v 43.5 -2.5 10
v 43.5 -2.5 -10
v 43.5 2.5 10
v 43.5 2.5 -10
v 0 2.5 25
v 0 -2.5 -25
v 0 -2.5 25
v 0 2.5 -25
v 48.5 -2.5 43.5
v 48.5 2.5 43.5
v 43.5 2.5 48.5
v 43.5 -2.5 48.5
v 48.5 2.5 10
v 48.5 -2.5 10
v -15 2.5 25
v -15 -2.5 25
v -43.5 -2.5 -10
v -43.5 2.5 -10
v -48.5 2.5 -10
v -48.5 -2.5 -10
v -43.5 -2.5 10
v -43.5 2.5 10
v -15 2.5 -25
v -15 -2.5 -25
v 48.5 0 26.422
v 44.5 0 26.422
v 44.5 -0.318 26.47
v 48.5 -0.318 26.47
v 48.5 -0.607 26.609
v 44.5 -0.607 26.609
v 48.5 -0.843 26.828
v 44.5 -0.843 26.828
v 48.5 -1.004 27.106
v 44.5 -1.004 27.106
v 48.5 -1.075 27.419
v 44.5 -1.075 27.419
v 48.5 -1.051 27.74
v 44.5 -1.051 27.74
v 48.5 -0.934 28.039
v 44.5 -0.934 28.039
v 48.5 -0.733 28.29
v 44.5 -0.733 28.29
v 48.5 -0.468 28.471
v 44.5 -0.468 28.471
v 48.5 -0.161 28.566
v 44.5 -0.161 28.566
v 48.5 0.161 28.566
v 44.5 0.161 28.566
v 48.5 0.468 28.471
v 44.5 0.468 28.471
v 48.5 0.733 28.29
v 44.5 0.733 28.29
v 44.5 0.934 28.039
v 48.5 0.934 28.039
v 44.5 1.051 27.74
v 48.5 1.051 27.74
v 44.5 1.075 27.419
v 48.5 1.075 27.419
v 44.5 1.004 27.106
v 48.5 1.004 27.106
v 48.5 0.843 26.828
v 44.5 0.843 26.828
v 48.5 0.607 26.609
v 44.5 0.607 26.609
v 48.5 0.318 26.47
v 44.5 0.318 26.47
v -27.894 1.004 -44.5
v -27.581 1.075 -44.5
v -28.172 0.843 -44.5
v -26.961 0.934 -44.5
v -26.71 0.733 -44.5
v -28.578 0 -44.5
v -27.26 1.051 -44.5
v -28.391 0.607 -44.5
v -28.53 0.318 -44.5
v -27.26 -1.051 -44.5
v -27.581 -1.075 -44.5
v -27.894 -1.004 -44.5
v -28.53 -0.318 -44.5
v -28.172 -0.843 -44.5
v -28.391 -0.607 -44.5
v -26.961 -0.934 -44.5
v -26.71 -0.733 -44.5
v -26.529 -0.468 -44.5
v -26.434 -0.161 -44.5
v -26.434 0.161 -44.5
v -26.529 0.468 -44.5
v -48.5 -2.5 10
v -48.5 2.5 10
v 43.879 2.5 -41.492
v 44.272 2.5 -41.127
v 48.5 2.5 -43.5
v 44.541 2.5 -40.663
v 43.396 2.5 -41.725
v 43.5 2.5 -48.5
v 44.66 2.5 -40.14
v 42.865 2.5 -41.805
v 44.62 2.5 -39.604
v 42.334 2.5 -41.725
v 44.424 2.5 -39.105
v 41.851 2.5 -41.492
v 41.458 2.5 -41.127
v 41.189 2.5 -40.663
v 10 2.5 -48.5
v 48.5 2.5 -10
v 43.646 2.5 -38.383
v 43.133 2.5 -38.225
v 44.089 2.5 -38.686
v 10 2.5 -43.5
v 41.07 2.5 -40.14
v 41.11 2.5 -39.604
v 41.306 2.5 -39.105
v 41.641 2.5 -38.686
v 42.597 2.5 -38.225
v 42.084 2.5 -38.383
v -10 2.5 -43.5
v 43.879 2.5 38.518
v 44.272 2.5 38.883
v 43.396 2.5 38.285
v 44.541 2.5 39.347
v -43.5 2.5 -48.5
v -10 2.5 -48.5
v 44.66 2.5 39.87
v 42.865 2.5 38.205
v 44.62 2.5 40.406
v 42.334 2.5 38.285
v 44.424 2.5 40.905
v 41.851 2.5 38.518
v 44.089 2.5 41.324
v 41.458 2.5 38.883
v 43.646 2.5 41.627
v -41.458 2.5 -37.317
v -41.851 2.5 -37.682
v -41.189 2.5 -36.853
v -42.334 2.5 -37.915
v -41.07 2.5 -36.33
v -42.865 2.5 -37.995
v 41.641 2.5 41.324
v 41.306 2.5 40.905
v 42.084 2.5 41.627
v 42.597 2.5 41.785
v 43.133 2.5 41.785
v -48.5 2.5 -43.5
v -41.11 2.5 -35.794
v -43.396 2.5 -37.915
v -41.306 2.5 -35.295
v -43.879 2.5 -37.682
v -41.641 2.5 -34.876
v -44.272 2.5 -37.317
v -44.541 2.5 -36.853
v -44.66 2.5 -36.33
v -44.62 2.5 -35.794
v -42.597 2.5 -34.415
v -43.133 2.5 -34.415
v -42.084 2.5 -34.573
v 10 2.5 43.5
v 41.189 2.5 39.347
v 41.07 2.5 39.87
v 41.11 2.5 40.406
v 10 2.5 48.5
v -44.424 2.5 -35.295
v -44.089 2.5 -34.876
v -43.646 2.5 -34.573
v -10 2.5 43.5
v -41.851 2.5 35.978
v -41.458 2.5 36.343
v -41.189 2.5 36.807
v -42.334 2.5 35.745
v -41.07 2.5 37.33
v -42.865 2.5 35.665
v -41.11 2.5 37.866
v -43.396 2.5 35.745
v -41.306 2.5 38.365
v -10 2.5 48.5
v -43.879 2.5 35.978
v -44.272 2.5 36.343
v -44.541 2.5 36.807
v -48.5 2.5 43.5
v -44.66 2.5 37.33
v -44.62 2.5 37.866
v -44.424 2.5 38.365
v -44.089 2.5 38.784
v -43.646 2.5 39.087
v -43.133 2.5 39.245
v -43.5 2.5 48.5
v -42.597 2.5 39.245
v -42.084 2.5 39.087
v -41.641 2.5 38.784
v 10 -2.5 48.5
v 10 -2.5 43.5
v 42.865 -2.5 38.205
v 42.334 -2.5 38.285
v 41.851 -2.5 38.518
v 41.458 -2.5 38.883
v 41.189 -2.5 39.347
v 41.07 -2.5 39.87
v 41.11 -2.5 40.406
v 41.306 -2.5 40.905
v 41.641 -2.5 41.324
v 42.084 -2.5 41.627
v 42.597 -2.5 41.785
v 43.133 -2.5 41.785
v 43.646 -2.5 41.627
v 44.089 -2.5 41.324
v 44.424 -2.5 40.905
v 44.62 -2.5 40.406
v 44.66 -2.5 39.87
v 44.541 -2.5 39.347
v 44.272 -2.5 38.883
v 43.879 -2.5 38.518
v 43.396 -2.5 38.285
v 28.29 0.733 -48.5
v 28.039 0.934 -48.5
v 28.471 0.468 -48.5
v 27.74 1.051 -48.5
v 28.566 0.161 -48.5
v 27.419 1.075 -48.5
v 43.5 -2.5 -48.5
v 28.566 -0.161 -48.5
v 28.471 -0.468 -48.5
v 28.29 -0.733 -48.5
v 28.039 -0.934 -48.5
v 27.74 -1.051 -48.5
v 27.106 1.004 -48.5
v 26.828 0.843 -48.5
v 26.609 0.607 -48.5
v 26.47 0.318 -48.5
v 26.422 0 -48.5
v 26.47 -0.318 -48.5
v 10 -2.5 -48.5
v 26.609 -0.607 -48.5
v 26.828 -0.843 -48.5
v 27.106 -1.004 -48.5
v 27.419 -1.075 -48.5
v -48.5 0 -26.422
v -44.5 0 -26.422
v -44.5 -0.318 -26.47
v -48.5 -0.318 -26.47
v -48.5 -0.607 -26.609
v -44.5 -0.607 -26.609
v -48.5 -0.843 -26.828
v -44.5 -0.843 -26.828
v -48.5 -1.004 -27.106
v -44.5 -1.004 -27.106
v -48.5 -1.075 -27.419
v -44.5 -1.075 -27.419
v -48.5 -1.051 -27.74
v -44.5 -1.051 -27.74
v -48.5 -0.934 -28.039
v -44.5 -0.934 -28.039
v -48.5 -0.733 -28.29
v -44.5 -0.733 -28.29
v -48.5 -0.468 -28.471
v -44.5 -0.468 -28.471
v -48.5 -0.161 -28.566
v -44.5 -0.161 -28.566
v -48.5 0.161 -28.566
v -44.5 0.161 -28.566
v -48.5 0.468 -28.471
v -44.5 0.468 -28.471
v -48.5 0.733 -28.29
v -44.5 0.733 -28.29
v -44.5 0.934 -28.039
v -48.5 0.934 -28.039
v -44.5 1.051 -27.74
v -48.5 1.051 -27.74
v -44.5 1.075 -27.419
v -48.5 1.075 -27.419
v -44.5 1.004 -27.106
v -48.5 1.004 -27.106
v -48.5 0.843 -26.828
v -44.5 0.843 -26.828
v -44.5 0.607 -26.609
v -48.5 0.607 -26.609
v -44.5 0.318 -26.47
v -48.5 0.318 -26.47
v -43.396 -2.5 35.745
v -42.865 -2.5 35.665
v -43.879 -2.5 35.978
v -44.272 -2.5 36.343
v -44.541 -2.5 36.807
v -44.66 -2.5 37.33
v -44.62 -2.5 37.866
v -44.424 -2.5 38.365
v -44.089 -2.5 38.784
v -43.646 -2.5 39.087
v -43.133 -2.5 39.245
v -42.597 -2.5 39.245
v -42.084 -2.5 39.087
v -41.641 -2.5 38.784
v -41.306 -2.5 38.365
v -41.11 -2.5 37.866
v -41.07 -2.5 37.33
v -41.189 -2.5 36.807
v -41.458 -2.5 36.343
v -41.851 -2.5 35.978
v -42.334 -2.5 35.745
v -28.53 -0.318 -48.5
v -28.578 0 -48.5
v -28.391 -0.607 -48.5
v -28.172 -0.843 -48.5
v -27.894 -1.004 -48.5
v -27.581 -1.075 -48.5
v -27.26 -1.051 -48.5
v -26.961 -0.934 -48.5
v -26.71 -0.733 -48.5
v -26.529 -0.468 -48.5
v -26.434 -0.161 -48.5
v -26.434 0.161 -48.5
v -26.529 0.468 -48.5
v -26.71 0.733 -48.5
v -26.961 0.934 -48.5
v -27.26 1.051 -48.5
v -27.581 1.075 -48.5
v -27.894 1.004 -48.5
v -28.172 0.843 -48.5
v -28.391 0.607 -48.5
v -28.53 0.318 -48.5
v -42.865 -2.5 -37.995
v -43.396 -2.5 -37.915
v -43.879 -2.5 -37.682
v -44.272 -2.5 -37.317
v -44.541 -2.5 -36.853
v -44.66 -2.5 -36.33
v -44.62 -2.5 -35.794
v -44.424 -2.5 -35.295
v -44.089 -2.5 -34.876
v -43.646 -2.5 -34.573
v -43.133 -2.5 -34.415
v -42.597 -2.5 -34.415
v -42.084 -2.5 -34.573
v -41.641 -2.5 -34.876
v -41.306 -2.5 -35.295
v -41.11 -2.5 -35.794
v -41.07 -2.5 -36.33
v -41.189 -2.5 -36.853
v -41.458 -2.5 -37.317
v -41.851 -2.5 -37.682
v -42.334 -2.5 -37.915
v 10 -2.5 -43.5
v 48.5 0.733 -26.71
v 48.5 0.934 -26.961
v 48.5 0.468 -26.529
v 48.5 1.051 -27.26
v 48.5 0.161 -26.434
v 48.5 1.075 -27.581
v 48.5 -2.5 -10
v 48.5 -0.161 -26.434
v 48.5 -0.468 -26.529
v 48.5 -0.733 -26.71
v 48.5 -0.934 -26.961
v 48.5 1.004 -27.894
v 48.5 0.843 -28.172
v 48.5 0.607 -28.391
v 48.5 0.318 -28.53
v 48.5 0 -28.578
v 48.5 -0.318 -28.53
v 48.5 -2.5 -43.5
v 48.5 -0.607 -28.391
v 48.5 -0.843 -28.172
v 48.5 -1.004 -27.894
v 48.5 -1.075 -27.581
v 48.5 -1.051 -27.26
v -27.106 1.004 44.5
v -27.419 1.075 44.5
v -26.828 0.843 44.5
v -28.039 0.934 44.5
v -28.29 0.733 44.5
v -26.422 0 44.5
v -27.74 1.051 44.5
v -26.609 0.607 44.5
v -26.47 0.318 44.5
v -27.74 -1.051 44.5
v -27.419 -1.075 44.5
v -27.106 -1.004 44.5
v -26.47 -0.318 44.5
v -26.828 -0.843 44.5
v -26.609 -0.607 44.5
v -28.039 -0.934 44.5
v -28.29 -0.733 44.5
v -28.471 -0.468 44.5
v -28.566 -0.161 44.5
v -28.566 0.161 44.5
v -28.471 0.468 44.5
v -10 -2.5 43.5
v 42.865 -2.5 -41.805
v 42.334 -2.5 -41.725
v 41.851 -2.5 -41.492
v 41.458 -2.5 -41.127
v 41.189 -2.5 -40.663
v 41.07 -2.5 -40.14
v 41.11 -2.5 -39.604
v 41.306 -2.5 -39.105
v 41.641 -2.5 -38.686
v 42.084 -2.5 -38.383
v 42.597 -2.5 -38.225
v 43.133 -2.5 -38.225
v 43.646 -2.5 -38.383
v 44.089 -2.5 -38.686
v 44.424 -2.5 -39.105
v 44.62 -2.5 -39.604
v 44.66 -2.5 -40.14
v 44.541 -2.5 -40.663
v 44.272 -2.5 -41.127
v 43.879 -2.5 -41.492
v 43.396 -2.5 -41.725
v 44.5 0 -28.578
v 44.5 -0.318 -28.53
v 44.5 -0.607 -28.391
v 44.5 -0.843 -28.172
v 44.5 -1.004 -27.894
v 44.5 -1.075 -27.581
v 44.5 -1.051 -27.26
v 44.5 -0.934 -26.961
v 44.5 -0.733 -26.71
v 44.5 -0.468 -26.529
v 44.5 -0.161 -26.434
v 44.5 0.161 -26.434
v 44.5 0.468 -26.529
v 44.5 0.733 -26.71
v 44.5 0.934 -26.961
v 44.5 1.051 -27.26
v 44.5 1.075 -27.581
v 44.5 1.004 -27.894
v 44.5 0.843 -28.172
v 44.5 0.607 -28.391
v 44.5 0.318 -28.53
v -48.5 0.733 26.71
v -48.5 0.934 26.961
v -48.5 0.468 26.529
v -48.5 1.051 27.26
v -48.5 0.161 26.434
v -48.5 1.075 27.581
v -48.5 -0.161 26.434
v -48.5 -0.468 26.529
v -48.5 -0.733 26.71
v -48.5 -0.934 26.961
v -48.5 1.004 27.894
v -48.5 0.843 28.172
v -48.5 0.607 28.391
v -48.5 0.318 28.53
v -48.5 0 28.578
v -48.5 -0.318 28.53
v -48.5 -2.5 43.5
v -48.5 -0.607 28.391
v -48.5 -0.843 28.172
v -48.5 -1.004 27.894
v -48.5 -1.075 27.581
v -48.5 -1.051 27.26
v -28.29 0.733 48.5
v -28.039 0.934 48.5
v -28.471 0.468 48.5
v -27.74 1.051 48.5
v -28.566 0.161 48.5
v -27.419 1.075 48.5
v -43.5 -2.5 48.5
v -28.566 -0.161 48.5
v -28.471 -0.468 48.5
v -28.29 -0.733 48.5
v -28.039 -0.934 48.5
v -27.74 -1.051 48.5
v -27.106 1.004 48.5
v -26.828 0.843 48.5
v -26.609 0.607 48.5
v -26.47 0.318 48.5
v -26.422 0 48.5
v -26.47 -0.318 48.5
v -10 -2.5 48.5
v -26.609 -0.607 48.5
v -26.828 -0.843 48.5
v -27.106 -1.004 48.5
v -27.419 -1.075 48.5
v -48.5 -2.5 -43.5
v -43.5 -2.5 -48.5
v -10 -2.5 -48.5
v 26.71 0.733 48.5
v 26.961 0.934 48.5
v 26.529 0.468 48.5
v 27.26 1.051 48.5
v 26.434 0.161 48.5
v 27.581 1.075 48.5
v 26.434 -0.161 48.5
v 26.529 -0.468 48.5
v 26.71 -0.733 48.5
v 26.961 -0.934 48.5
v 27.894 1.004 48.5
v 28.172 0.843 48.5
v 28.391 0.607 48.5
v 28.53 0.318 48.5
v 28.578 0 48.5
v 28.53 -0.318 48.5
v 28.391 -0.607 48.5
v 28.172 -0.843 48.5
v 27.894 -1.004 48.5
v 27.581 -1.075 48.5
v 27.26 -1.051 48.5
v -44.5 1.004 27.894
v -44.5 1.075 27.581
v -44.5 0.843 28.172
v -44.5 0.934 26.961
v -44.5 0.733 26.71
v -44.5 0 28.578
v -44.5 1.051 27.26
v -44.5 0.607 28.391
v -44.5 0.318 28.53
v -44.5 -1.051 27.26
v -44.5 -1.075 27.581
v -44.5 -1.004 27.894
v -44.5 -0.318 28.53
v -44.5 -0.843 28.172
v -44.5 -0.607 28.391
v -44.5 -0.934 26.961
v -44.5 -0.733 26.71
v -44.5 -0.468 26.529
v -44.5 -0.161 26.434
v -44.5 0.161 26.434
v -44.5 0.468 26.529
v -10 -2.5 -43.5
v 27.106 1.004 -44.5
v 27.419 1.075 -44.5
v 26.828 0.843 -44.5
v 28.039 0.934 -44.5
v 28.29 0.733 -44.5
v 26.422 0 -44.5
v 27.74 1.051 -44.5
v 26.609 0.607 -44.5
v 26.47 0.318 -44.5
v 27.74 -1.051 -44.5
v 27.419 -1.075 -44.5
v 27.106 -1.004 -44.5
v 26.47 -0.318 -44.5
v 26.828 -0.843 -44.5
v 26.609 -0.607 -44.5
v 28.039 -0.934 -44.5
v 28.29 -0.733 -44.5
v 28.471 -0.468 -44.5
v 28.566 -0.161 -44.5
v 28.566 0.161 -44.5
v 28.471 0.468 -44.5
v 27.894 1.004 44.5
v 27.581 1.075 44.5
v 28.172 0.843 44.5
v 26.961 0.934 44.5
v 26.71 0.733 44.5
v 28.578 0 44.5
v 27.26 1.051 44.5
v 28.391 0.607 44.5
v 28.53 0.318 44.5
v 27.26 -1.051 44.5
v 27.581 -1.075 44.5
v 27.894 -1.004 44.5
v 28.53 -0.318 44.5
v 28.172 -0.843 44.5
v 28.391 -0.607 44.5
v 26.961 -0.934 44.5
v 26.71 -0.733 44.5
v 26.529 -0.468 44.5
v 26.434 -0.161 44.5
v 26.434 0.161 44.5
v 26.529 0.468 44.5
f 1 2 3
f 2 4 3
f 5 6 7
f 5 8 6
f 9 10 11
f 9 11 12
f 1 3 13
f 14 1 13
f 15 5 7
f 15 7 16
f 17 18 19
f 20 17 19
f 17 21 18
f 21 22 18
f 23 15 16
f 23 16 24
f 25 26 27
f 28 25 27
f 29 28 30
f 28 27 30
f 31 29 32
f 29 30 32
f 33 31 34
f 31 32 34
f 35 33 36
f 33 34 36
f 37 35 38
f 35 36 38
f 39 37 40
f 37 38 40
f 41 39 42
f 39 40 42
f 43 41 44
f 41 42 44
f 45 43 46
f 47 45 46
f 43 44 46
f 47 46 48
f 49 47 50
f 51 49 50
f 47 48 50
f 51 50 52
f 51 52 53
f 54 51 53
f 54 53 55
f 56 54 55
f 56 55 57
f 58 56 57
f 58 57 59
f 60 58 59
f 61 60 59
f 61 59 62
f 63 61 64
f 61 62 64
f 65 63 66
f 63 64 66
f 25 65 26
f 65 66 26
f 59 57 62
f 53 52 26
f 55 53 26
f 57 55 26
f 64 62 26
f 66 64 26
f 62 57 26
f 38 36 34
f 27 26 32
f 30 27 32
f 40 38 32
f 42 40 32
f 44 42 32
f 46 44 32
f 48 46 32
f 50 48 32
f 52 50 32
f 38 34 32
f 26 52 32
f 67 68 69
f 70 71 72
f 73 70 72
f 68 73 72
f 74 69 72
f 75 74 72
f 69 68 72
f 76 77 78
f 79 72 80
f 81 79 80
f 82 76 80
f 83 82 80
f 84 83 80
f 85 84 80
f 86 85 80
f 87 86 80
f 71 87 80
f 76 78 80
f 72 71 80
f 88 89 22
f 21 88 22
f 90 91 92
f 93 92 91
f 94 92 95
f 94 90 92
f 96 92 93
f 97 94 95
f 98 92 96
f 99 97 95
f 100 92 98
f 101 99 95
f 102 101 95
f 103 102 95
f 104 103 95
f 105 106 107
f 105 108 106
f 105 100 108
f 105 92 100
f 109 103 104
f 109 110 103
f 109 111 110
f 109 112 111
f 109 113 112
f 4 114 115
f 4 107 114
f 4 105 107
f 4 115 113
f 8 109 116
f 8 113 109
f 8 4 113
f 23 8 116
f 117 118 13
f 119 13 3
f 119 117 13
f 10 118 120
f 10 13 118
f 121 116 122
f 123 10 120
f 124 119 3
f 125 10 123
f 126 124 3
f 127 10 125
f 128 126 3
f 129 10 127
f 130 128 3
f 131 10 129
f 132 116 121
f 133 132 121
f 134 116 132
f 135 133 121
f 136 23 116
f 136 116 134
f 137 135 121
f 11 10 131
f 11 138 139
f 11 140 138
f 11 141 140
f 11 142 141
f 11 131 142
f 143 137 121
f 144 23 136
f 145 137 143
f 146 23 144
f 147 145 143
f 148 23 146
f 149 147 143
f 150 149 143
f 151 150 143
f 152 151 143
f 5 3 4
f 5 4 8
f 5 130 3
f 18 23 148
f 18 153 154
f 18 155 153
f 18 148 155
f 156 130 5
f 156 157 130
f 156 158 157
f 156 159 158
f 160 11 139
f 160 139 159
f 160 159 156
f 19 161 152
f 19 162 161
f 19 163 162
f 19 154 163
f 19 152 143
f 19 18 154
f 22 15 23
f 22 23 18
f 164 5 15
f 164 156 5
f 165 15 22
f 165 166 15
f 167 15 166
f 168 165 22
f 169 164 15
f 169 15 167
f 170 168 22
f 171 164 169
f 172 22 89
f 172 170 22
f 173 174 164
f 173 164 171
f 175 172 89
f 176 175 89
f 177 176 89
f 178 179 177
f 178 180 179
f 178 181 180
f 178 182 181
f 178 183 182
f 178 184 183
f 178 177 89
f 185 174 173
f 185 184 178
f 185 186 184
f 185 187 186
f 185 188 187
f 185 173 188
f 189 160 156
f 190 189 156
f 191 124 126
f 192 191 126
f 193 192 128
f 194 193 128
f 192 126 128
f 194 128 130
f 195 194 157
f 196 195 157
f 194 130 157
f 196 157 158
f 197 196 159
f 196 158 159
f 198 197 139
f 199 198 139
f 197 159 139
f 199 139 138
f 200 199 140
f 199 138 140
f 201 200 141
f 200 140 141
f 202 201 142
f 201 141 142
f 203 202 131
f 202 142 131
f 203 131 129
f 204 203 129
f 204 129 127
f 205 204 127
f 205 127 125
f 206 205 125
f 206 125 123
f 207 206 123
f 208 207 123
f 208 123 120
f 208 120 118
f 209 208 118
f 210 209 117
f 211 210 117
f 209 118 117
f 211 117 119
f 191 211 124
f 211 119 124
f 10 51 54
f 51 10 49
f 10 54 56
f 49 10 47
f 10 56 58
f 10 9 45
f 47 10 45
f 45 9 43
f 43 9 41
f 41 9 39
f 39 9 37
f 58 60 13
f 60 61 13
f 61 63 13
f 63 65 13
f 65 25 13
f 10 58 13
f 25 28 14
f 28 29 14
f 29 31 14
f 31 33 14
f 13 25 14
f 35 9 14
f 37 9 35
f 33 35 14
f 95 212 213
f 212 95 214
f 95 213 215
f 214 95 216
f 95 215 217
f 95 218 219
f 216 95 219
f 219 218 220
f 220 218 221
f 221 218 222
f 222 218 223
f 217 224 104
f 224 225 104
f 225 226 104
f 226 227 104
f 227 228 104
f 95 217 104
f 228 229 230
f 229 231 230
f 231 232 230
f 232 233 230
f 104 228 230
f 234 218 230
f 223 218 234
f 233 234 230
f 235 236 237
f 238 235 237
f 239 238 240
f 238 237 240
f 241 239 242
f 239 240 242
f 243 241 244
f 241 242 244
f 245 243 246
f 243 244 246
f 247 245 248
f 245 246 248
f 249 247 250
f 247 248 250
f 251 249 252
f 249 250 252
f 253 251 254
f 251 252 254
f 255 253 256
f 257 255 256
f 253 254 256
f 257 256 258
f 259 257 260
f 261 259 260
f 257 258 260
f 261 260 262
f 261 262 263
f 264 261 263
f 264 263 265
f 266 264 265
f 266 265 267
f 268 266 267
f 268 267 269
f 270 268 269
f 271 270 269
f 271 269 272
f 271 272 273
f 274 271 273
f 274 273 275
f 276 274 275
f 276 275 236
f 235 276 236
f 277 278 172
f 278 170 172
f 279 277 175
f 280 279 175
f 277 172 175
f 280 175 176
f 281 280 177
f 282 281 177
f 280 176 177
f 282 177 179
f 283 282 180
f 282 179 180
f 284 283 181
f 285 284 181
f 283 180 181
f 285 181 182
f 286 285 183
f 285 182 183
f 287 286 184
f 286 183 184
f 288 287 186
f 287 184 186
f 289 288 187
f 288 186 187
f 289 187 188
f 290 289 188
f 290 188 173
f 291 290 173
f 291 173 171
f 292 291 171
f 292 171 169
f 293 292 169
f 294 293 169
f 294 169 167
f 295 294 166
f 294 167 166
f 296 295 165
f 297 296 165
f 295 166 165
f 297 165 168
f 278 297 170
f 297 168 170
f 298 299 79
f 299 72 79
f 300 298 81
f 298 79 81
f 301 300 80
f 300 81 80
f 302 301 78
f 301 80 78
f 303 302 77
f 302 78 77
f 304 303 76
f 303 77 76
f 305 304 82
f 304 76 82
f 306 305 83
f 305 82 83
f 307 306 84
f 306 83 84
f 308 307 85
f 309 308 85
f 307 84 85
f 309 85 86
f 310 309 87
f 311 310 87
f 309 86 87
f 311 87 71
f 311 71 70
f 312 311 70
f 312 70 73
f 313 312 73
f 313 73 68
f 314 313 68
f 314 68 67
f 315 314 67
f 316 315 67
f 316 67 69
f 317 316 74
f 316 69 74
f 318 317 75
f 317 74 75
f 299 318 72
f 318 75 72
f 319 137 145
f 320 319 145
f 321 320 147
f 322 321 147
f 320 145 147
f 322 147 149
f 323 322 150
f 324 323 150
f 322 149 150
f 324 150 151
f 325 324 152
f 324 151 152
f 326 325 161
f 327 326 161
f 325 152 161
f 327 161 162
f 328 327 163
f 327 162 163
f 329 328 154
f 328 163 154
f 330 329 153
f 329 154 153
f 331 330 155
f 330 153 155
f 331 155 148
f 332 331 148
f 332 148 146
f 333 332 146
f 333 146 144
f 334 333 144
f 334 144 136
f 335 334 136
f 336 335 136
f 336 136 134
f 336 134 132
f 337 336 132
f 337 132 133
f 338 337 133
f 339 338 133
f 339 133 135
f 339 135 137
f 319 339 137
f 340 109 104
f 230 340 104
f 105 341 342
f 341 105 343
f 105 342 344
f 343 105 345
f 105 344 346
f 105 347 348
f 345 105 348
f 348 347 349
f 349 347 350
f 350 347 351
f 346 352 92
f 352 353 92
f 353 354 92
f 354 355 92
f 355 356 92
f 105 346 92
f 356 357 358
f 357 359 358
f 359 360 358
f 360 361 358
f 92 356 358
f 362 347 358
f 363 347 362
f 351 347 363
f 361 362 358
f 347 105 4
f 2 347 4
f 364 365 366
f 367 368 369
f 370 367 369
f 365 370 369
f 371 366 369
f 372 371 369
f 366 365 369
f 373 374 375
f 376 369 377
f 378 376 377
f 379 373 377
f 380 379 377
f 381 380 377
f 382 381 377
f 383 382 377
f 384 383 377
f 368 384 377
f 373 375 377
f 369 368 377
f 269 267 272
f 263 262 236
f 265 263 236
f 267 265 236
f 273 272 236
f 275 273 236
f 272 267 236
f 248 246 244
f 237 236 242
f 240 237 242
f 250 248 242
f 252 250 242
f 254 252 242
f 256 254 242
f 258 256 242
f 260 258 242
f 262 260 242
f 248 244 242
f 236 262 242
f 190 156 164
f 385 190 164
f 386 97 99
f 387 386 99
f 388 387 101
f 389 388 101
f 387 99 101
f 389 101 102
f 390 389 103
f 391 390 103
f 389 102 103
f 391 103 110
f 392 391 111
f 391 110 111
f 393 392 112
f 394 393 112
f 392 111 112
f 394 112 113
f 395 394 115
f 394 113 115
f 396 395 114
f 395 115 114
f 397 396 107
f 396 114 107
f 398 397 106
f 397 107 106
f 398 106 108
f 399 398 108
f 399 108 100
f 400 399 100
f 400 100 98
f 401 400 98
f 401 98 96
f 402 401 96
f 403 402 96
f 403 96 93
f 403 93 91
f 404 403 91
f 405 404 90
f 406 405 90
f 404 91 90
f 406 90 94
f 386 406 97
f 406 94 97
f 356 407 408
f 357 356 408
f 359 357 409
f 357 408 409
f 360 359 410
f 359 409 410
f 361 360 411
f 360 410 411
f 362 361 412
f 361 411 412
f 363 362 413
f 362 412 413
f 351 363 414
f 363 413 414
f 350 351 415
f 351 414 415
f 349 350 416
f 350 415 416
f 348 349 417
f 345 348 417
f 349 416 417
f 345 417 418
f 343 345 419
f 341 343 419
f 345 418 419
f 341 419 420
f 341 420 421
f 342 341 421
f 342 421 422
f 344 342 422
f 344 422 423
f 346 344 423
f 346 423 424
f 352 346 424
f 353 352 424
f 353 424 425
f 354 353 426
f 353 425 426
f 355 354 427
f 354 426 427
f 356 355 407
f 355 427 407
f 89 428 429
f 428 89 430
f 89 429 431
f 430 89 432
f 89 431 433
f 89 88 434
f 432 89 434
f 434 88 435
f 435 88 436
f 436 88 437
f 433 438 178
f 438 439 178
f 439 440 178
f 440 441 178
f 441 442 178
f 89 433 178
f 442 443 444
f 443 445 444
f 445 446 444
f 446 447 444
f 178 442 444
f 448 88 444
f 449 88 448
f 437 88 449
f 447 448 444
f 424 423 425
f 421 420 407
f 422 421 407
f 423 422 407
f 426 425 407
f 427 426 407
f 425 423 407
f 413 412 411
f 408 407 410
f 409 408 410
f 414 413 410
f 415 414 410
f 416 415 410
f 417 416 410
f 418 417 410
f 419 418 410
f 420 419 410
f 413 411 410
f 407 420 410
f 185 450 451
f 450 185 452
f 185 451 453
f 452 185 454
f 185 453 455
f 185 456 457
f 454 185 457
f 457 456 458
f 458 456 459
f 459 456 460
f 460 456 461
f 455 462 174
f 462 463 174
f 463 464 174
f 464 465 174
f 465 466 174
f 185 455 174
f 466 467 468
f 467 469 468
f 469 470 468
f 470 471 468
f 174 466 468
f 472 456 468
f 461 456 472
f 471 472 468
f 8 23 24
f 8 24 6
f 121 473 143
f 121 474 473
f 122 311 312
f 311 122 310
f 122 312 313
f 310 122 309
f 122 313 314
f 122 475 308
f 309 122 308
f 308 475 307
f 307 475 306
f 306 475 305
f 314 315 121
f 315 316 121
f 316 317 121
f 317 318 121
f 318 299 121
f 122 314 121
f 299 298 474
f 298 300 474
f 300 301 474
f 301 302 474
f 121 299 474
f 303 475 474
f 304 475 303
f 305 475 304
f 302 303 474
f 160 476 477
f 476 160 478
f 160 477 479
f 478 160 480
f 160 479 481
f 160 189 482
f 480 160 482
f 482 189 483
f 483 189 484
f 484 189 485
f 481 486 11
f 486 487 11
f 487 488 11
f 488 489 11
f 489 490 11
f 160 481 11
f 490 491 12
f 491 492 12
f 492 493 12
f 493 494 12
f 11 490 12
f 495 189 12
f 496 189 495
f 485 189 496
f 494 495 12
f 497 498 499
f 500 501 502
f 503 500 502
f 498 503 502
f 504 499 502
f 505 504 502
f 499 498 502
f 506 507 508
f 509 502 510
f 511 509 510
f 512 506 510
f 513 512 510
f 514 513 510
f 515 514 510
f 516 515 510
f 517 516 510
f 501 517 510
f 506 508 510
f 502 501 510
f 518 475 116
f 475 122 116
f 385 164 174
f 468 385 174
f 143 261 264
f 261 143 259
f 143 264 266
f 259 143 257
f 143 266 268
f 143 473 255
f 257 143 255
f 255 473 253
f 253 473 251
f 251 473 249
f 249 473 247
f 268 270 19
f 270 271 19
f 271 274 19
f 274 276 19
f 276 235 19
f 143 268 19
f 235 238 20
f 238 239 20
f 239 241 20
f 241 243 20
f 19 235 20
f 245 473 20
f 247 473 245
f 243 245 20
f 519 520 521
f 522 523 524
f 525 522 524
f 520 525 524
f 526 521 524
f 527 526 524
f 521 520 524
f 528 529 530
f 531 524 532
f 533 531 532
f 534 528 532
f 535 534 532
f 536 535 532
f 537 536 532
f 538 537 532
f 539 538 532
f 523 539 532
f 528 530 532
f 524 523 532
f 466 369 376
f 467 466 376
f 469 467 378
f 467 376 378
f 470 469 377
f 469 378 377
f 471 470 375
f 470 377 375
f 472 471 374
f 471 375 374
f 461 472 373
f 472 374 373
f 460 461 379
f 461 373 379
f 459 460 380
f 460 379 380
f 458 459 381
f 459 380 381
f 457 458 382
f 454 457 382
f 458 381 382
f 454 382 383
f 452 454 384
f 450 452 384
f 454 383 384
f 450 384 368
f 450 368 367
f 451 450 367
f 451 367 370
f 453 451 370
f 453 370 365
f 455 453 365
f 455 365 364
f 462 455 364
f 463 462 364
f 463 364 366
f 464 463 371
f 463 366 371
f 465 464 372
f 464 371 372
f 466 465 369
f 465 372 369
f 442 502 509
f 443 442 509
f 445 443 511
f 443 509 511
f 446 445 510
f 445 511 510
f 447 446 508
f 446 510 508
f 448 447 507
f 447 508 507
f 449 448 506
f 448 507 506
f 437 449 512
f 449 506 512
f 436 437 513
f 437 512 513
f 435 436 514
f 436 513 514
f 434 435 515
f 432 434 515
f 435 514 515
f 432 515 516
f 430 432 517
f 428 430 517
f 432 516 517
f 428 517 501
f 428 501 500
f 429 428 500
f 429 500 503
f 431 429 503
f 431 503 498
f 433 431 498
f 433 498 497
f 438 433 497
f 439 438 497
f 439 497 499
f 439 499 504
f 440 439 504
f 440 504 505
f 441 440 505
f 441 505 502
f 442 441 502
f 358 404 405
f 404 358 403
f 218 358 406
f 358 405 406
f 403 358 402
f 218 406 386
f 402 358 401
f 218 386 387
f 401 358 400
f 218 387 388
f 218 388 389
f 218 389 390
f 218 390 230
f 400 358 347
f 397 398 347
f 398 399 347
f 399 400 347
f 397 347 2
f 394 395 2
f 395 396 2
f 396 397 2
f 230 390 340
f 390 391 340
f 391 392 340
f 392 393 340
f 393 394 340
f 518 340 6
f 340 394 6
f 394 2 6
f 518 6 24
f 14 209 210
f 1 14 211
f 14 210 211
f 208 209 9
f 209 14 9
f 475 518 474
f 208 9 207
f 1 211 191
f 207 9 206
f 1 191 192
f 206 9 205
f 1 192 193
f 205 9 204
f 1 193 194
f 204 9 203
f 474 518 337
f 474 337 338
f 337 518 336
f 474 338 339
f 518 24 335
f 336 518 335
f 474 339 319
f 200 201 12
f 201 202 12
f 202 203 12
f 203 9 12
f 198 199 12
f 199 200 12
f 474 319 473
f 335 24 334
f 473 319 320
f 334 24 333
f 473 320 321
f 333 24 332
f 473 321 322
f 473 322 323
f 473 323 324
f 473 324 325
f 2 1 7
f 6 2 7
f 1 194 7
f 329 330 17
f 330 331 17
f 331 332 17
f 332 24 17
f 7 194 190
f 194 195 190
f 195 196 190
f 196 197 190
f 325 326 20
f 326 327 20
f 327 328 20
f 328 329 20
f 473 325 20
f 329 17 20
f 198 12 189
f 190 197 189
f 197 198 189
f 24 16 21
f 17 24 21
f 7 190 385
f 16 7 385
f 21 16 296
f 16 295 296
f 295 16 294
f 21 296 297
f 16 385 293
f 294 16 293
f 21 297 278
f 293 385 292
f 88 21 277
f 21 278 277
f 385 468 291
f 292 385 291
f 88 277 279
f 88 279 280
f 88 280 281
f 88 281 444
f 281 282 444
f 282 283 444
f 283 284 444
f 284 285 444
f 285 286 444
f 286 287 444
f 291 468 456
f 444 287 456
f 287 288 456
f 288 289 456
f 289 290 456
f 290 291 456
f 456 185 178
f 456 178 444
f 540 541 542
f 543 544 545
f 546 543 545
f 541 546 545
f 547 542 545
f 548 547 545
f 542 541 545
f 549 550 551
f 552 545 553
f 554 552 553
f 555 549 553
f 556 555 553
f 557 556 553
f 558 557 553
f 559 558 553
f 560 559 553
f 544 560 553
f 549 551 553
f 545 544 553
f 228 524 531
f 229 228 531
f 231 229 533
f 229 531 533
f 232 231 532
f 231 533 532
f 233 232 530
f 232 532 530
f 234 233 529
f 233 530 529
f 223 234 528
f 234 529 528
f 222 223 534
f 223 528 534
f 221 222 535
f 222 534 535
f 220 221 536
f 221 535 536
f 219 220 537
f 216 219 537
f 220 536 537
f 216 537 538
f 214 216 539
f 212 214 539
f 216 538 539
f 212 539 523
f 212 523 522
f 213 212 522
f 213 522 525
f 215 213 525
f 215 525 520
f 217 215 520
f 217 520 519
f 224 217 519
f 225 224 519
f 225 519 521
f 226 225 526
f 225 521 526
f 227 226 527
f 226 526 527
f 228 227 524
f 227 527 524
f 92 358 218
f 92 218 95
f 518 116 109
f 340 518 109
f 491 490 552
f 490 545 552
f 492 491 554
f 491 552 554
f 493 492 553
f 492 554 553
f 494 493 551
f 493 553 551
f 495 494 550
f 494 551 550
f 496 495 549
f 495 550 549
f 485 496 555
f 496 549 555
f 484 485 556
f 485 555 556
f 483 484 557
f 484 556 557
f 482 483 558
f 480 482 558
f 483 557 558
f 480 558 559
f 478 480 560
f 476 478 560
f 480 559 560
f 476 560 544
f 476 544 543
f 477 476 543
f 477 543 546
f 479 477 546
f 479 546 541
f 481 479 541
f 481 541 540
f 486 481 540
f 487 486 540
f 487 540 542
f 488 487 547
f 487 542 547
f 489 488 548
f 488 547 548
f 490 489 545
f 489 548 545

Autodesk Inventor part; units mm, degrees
ref_plane "YZ Plane" through (0, 0, 0) normal (1, 0, 0) x (0, 1, 0)
ref_plane "XZ Plane" through (0, 0, 0) normal (0, 1, 0) x (-1, 0, 0)
ref_plane "XY Plane" through (0, 0, 0) normal (0, 0, 1) x (1, 0, 0)
sketch "Sketch1" plane through (0, 0, 0) normal (0, 1, 0) x (-1, 0, 0)
  line L0 (48.5, 48.5) -> (-48.5, 48.5)
  line L1 (-48.5, 48.5) -> (-48.5, -48.5)
  line L2 (-48.5, -48.5) -> (48.5, -48.5)
  line L3 (48.5, -48.5) -> (48.5, 48.5)
  point P0 (0, 0)
  point P1 (48.5, 0)
  point P2 (0, -48.5)
  dimension "d0" = 97
  dimension "d1" = 97
extrude "Extrusion1" add sketch "Sketch1" along normal mid plane 5
sketch "Sketch2" plane through (0, -2.5, 0) normal (0, -1, 0) x (1, 0, 0)
  line L0 (-42.865, 37.465) -> (-42.865, -36.195) construction
  line L1 (42.865, 40.005) -> (42.865, -40.005) construction
  line L2 (-42.865, 6.4948) -> (42.865, 6.4948) construction
  point P0 (0, 0)
  point P1 (42.865, 0)
  point P2 (0, 6.4948)
  dimension "d4" = 73.66
  dimension "d5" = 80.01
  dimension "d6" = 85.73
  dimension "d7" = 3.81
hole "Hole1" at (-42.865, -2.5, 37.465) at (42.865, -2.5, 40.005) at (-42.865, -2.5, -36.195) at (42.865, -2.5, -40.005) direction (0, 1, 0) diameter 3.6 end through all clearance for "Flat Head Machine Screw" size "M3" standard "Ansi Metric M Profile"
chamfer "Chamfer1" distance 5 angle 45 4 edges at (48.5, 0, -48.5) (-48.5, 0, -48.5) (48.5, 0, 48.5) (-48.5, 0, 48.5)
sketch "Sketch3" plane through (48.5, -2.5, 43.5) normal (1, 0, 0) x (0, 0, -1)
  point P0 (43.5, 2.5)
  point P1 (71, 2.5)
  point P2 (16, 2.5)
  dimension "d18" = 55
  dimension "d19" = 27.5
hole "Hole2" at (48.5, 0, -27.5) at (48.5, 0, 27.5) direction (-1, 0, 0) diameter 2.1565 depth 4 thread size "4-40 UNC" class "2B" standard "ANSI Unified Screw Threads"
pattern_circular "Circular Pattern1" count 4 over 360 about axis through (0, -10, 0) along (0, 1, 0) of "Hole2"
sketch "Sketch5" plane through (0, 2.5, 0) normal (0, 1, 0) x (1, 0, 0)
  line L0 (-15, 25) -> (0, 25)
  line L1 (0, 25) -> (0, -25)
  line L2 (0, -25) -> (-15, -25)
  line L3 (-15, -25) -> (-15, 25)
  point P0 (0, 0)
  point P1 (0, 0)
  dimension "d38" = 15
  dimension "d39" = 50
extrude "Extrusion3" cut sketch "Sketch5" against normal through all
sketch "Sketch6" plane through (0, 2.5, 0) normal (0, 1, 0) x (1, 0, 0)
  line L0 (-48.5, 43.5) -> (-48.5, -43.5) projected
  line L1 (-43.5, 10) -> (-48.5, 10)
  line L2 (-48.5, 10) -> (-48.5, -10)
  line L3 (-48.5, -10) -> (-43.5, -10)
  line L4 (-43.5, -10) -> (-43.5, 10)
  point P0 (0, 0)
  point P1 (-48.5, 0)
  dimension "d42" = 5
  dimension "d43" = 20
extrude "Extrusion4" cut sketch "Sketch6" against normal through all
pattern_circular "Circular Pattern3" count 4 over 360 about axis through (0, -10, 0) along (0, 1, 0) of "Extrusion4"
equation "\"d1\" = d0"
equation "\"d19\" = 0.5 * d18"
properties part number "stackframesupport" material "Aluminum 6061"
